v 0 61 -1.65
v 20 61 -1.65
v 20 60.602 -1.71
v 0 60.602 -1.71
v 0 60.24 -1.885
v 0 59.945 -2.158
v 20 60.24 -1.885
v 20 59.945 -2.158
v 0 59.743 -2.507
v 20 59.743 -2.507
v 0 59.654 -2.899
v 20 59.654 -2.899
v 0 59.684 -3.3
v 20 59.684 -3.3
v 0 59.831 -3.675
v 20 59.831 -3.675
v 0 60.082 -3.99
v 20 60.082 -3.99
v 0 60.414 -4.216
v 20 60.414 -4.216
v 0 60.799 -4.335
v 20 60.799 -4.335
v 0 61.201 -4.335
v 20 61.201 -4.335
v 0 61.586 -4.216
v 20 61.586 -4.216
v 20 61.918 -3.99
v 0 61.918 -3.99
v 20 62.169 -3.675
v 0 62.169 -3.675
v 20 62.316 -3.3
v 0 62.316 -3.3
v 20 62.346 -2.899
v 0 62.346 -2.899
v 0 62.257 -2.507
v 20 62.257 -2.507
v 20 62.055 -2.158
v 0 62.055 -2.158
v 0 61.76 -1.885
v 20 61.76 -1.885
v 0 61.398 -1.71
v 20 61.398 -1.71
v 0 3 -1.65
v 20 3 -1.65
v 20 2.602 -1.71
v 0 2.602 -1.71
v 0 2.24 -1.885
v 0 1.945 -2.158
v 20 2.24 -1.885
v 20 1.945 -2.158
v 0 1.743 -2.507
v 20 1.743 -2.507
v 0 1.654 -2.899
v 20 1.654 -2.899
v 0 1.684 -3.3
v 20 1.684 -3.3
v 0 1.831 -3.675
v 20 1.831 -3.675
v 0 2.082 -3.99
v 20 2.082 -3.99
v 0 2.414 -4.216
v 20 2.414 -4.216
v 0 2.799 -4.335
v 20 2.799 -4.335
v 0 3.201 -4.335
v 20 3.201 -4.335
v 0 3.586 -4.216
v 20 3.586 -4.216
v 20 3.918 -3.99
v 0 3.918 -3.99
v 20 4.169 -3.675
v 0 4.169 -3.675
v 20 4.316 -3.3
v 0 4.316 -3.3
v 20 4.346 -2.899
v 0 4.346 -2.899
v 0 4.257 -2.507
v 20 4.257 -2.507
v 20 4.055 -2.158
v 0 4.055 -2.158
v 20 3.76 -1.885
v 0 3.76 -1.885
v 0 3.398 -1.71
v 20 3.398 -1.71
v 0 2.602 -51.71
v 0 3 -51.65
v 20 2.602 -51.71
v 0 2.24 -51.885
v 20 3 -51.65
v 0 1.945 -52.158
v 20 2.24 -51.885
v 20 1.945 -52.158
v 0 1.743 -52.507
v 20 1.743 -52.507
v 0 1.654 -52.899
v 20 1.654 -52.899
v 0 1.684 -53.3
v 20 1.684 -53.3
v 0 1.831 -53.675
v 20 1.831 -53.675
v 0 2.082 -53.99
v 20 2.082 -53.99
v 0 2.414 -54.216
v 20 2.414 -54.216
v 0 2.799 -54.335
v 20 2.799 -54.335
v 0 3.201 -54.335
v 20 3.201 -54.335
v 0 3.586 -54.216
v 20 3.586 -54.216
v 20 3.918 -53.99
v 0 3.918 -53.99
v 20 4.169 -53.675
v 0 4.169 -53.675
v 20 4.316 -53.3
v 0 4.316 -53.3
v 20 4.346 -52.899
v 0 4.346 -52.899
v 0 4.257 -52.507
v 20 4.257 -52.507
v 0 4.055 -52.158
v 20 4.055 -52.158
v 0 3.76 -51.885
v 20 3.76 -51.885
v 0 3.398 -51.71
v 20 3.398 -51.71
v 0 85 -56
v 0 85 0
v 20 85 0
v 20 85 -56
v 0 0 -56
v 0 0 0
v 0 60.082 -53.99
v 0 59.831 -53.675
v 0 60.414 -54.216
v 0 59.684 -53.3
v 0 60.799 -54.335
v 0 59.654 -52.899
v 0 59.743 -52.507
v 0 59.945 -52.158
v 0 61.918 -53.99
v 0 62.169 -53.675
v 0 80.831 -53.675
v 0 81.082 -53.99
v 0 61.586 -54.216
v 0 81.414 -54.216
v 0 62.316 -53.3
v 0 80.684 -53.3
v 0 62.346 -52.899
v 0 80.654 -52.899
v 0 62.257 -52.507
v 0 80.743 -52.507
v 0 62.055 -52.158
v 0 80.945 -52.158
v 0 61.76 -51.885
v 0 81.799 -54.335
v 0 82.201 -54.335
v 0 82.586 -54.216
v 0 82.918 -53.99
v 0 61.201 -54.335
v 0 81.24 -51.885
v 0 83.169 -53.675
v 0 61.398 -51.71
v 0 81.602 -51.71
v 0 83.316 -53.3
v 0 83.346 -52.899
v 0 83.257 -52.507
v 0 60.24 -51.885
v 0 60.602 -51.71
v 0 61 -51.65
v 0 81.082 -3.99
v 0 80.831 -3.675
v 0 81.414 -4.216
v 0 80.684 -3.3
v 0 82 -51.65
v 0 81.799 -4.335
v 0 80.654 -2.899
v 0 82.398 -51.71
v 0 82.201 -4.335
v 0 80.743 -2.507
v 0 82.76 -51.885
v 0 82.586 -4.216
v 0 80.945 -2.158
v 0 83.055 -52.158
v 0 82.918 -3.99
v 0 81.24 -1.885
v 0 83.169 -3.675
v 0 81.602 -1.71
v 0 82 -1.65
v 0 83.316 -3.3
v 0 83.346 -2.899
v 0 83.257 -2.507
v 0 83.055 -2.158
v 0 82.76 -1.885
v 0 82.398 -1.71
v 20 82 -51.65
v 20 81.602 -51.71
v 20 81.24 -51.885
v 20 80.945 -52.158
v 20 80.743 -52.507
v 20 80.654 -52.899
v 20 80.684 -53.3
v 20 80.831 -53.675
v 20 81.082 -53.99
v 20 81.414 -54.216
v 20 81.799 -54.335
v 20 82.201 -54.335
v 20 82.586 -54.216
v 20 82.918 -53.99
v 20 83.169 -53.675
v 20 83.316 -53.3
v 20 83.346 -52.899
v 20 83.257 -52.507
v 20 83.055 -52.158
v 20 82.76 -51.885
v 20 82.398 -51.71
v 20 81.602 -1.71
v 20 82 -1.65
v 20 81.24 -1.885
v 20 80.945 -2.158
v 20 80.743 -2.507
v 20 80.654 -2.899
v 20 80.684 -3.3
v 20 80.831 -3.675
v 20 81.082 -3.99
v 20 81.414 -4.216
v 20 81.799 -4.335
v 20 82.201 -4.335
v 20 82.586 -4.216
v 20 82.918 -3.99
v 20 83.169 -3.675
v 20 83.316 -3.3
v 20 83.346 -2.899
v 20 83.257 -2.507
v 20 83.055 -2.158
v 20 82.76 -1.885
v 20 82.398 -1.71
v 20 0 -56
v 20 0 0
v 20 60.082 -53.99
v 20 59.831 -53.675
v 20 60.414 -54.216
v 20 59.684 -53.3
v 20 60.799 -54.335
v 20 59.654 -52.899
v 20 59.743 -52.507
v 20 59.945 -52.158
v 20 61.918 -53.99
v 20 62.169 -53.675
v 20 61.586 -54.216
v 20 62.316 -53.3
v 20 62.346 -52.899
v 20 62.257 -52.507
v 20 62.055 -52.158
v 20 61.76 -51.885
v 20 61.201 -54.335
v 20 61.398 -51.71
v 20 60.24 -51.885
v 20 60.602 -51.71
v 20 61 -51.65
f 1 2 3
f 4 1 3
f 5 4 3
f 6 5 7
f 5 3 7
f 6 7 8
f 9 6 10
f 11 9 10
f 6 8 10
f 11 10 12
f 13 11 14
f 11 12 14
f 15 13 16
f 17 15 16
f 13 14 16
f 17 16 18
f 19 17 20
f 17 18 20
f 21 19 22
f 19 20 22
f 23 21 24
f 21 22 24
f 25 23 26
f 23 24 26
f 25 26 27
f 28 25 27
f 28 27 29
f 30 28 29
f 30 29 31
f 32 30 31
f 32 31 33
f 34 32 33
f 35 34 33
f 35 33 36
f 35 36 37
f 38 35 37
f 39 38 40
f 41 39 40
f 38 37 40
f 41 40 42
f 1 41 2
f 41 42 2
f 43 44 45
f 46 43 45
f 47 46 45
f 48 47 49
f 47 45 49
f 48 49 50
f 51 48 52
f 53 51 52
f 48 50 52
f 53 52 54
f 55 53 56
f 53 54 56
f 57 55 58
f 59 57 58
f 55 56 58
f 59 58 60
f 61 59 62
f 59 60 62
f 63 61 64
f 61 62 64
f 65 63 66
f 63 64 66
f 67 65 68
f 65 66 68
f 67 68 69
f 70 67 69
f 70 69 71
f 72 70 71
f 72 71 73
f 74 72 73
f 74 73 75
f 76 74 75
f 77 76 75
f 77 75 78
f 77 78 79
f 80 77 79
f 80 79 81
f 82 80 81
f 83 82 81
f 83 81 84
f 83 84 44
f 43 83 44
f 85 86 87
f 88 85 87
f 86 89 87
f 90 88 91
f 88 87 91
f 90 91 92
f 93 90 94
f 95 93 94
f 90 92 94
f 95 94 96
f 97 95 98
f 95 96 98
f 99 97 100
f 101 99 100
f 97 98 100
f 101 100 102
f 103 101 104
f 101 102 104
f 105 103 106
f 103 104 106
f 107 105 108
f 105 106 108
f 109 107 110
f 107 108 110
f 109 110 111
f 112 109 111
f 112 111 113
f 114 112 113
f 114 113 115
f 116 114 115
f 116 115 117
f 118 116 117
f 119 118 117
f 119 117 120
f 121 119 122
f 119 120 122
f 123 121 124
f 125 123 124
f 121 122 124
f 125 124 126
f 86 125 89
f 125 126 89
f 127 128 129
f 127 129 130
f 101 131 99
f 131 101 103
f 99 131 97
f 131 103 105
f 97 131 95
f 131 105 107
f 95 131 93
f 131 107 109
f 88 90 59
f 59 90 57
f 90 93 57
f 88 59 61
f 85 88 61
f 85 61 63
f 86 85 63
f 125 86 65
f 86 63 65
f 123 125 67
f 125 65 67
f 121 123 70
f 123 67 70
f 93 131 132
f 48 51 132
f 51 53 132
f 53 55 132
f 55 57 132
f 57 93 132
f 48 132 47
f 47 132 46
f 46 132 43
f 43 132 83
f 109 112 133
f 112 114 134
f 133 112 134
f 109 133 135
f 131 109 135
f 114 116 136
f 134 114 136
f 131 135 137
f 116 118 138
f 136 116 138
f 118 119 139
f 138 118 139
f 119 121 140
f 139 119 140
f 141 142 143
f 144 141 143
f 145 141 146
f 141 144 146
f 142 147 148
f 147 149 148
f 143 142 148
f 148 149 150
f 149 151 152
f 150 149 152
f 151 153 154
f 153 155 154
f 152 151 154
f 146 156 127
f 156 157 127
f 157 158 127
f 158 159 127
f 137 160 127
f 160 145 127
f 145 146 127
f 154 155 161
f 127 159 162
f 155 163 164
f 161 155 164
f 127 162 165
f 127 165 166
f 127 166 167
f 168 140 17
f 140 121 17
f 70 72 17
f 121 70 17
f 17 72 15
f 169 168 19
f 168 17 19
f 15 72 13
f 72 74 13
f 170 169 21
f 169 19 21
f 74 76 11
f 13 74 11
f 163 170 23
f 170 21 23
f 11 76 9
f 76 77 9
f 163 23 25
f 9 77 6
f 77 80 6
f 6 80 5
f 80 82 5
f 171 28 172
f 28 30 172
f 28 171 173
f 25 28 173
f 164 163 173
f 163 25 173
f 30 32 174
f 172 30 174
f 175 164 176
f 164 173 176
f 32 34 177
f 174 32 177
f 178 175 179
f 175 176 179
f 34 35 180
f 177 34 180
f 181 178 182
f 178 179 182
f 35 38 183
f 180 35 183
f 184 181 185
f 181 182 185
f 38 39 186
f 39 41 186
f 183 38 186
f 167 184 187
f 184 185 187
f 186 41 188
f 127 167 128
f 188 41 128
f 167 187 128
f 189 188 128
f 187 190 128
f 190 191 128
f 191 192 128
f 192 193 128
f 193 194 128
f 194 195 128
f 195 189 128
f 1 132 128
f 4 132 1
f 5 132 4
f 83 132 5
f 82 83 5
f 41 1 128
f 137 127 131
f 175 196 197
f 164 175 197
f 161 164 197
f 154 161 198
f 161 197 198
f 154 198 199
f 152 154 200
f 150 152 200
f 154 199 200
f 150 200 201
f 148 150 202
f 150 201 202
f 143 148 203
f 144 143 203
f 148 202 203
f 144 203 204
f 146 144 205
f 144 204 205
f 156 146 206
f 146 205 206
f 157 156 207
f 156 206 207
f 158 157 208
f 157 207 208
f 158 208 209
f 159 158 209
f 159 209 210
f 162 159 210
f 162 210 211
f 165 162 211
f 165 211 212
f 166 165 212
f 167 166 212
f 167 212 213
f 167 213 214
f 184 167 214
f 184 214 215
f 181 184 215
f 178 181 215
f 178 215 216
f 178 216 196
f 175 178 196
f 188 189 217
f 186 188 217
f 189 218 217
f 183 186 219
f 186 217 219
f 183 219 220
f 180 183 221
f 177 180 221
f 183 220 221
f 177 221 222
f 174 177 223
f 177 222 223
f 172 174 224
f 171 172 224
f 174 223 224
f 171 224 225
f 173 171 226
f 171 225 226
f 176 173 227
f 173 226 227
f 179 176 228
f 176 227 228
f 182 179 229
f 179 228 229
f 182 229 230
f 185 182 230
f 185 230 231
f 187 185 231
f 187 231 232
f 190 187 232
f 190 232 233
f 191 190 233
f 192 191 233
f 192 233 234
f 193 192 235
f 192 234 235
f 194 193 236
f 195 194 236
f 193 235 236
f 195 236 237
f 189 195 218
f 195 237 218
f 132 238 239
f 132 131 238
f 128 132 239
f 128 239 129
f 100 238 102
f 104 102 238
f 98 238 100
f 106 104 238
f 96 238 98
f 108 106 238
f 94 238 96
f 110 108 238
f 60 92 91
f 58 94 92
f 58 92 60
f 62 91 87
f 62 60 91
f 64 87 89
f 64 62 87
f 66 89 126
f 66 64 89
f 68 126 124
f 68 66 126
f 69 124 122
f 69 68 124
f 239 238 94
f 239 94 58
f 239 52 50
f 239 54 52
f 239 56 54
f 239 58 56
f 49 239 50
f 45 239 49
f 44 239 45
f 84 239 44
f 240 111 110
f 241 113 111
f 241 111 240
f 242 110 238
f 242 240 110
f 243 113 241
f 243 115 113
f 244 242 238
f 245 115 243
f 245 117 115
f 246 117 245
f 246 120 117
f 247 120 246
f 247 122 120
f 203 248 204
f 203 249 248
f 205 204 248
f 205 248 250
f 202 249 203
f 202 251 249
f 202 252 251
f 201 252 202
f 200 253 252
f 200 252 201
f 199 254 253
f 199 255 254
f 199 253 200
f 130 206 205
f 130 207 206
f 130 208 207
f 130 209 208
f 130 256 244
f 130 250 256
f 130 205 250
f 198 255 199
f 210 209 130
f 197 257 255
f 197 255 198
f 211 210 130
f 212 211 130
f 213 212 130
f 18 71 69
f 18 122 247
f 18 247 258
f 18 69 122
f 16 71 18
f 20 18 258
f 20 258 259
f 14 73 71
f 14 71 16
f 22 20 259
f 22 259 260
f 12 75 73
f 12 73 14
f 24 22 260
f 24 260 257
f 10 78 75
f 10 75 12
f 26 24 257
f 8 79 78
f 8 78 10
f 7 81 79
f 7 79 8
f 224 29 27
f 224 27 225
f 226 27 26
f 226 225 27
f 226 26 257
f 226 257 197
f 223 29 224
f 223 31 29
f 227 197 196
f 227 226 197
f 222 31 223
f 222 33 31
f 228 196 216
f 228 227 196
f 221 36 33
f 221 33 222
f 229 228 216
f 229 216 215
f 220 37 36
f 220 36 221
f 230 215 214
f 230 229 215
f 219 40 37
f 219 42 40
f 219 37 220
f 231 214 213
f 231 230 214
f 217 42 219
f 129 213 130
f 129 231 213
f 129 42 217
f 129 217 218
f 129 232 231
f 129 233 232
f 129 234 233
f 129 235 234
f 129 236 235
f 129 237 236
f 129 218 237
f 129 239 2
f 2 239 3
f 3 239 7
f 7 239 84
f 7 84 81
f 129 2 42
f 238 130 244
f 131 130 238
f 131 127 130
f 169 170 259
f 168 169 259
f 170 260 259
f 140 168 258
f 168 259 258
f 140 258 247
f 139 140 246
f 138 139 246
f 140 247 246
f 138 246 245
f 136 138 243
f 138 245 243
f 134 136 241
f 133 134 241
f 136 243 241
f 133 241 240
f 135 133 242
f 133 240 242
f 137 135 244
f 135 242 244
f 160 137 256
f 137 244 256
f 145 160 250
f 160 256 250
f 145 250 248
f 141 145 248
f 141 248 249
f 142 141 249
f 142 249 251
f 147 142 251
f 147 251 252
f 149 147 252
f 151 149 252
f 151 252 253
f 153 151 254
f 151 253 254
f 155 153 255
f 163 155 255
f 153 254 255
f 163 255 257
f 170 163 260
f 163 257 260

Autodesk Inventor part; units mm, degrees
ref_plane "YZ Plane" through (0, 0, 0) normal (1, 0, 0) x (0, 1, 0)
ref_plane "XZ Plane" through (0, 0, 0) normal (0, 1, 0) x (-1, 0, 0)
ref_plane "XY Plane" through (0, 0, 0) normal (0, 0, 1) x (1, 0, 0)
sketch "Sketch1" plane through (0, 0, 0) normal (1, 0, 0) x (0, 1, 0)
  line L0 (0, 0) -> (85, 0)
  line L1 (85, 0) -> (85, -56)
  line L2 (85, -56) -> (0, -56)
  line L3 (0, -56) -> (0, 0)
  dimension "d0" = 85
  dimension "d1" = 56
extrude "Extrusion1" add sketch "Sketch1" along normal blind 20
sketch "Sketch2" plane through (0, 0, 0) normal (-1, 0, 0) x (0, 0, 1)
  line L0 (-3, 82) -> (-53, 82)
  line L1 (-53, 82) -> (-53, 3)
  line L2 (-53, 3) -> (-3, 3)
  line L3 (-3, 3) -> (-3, 82)
  line L4 (0, 0) -> (-56, 0) projected
  line L5 (0, 85) -> (0, 0) projected
  line L6 (-56, 85) -> (0, 85) projected
  line L7 (-56, 0) -> (-56, 85) projected
  line L8 (-53, 61) -> (-3, 61)
  dimension "d4" = 3
  dimension "d5" = 3
  dimension "d6" = 3
  dimension "d7" = 3
  dimension "d36" = 58
hole "Hole1" at (0, 3, -53) direction (1, 0, 0) diameter 2.7 depth 20
hole "Hole2" at (0, 3, -3) direction (1, 0, 0) diameter 2.7 depth 20
hole "Hole3" at (0, 82, -3) direction (1, 0, 0) diameter 2.7 depth 20
hole "Hole4" at (0, 82, -53) direction (1, 0, 0) diameter 2.7 depth 20
hole "Hole5" at (0, 61, -53) direction (1, 0, 0) diameter 2.7 depth 20
hole "Hole6" at (0, 61, -3) direction (1, 0, 0) diameter 2.7 depth 20
properties part number "raspi" material "Polypropylene"
